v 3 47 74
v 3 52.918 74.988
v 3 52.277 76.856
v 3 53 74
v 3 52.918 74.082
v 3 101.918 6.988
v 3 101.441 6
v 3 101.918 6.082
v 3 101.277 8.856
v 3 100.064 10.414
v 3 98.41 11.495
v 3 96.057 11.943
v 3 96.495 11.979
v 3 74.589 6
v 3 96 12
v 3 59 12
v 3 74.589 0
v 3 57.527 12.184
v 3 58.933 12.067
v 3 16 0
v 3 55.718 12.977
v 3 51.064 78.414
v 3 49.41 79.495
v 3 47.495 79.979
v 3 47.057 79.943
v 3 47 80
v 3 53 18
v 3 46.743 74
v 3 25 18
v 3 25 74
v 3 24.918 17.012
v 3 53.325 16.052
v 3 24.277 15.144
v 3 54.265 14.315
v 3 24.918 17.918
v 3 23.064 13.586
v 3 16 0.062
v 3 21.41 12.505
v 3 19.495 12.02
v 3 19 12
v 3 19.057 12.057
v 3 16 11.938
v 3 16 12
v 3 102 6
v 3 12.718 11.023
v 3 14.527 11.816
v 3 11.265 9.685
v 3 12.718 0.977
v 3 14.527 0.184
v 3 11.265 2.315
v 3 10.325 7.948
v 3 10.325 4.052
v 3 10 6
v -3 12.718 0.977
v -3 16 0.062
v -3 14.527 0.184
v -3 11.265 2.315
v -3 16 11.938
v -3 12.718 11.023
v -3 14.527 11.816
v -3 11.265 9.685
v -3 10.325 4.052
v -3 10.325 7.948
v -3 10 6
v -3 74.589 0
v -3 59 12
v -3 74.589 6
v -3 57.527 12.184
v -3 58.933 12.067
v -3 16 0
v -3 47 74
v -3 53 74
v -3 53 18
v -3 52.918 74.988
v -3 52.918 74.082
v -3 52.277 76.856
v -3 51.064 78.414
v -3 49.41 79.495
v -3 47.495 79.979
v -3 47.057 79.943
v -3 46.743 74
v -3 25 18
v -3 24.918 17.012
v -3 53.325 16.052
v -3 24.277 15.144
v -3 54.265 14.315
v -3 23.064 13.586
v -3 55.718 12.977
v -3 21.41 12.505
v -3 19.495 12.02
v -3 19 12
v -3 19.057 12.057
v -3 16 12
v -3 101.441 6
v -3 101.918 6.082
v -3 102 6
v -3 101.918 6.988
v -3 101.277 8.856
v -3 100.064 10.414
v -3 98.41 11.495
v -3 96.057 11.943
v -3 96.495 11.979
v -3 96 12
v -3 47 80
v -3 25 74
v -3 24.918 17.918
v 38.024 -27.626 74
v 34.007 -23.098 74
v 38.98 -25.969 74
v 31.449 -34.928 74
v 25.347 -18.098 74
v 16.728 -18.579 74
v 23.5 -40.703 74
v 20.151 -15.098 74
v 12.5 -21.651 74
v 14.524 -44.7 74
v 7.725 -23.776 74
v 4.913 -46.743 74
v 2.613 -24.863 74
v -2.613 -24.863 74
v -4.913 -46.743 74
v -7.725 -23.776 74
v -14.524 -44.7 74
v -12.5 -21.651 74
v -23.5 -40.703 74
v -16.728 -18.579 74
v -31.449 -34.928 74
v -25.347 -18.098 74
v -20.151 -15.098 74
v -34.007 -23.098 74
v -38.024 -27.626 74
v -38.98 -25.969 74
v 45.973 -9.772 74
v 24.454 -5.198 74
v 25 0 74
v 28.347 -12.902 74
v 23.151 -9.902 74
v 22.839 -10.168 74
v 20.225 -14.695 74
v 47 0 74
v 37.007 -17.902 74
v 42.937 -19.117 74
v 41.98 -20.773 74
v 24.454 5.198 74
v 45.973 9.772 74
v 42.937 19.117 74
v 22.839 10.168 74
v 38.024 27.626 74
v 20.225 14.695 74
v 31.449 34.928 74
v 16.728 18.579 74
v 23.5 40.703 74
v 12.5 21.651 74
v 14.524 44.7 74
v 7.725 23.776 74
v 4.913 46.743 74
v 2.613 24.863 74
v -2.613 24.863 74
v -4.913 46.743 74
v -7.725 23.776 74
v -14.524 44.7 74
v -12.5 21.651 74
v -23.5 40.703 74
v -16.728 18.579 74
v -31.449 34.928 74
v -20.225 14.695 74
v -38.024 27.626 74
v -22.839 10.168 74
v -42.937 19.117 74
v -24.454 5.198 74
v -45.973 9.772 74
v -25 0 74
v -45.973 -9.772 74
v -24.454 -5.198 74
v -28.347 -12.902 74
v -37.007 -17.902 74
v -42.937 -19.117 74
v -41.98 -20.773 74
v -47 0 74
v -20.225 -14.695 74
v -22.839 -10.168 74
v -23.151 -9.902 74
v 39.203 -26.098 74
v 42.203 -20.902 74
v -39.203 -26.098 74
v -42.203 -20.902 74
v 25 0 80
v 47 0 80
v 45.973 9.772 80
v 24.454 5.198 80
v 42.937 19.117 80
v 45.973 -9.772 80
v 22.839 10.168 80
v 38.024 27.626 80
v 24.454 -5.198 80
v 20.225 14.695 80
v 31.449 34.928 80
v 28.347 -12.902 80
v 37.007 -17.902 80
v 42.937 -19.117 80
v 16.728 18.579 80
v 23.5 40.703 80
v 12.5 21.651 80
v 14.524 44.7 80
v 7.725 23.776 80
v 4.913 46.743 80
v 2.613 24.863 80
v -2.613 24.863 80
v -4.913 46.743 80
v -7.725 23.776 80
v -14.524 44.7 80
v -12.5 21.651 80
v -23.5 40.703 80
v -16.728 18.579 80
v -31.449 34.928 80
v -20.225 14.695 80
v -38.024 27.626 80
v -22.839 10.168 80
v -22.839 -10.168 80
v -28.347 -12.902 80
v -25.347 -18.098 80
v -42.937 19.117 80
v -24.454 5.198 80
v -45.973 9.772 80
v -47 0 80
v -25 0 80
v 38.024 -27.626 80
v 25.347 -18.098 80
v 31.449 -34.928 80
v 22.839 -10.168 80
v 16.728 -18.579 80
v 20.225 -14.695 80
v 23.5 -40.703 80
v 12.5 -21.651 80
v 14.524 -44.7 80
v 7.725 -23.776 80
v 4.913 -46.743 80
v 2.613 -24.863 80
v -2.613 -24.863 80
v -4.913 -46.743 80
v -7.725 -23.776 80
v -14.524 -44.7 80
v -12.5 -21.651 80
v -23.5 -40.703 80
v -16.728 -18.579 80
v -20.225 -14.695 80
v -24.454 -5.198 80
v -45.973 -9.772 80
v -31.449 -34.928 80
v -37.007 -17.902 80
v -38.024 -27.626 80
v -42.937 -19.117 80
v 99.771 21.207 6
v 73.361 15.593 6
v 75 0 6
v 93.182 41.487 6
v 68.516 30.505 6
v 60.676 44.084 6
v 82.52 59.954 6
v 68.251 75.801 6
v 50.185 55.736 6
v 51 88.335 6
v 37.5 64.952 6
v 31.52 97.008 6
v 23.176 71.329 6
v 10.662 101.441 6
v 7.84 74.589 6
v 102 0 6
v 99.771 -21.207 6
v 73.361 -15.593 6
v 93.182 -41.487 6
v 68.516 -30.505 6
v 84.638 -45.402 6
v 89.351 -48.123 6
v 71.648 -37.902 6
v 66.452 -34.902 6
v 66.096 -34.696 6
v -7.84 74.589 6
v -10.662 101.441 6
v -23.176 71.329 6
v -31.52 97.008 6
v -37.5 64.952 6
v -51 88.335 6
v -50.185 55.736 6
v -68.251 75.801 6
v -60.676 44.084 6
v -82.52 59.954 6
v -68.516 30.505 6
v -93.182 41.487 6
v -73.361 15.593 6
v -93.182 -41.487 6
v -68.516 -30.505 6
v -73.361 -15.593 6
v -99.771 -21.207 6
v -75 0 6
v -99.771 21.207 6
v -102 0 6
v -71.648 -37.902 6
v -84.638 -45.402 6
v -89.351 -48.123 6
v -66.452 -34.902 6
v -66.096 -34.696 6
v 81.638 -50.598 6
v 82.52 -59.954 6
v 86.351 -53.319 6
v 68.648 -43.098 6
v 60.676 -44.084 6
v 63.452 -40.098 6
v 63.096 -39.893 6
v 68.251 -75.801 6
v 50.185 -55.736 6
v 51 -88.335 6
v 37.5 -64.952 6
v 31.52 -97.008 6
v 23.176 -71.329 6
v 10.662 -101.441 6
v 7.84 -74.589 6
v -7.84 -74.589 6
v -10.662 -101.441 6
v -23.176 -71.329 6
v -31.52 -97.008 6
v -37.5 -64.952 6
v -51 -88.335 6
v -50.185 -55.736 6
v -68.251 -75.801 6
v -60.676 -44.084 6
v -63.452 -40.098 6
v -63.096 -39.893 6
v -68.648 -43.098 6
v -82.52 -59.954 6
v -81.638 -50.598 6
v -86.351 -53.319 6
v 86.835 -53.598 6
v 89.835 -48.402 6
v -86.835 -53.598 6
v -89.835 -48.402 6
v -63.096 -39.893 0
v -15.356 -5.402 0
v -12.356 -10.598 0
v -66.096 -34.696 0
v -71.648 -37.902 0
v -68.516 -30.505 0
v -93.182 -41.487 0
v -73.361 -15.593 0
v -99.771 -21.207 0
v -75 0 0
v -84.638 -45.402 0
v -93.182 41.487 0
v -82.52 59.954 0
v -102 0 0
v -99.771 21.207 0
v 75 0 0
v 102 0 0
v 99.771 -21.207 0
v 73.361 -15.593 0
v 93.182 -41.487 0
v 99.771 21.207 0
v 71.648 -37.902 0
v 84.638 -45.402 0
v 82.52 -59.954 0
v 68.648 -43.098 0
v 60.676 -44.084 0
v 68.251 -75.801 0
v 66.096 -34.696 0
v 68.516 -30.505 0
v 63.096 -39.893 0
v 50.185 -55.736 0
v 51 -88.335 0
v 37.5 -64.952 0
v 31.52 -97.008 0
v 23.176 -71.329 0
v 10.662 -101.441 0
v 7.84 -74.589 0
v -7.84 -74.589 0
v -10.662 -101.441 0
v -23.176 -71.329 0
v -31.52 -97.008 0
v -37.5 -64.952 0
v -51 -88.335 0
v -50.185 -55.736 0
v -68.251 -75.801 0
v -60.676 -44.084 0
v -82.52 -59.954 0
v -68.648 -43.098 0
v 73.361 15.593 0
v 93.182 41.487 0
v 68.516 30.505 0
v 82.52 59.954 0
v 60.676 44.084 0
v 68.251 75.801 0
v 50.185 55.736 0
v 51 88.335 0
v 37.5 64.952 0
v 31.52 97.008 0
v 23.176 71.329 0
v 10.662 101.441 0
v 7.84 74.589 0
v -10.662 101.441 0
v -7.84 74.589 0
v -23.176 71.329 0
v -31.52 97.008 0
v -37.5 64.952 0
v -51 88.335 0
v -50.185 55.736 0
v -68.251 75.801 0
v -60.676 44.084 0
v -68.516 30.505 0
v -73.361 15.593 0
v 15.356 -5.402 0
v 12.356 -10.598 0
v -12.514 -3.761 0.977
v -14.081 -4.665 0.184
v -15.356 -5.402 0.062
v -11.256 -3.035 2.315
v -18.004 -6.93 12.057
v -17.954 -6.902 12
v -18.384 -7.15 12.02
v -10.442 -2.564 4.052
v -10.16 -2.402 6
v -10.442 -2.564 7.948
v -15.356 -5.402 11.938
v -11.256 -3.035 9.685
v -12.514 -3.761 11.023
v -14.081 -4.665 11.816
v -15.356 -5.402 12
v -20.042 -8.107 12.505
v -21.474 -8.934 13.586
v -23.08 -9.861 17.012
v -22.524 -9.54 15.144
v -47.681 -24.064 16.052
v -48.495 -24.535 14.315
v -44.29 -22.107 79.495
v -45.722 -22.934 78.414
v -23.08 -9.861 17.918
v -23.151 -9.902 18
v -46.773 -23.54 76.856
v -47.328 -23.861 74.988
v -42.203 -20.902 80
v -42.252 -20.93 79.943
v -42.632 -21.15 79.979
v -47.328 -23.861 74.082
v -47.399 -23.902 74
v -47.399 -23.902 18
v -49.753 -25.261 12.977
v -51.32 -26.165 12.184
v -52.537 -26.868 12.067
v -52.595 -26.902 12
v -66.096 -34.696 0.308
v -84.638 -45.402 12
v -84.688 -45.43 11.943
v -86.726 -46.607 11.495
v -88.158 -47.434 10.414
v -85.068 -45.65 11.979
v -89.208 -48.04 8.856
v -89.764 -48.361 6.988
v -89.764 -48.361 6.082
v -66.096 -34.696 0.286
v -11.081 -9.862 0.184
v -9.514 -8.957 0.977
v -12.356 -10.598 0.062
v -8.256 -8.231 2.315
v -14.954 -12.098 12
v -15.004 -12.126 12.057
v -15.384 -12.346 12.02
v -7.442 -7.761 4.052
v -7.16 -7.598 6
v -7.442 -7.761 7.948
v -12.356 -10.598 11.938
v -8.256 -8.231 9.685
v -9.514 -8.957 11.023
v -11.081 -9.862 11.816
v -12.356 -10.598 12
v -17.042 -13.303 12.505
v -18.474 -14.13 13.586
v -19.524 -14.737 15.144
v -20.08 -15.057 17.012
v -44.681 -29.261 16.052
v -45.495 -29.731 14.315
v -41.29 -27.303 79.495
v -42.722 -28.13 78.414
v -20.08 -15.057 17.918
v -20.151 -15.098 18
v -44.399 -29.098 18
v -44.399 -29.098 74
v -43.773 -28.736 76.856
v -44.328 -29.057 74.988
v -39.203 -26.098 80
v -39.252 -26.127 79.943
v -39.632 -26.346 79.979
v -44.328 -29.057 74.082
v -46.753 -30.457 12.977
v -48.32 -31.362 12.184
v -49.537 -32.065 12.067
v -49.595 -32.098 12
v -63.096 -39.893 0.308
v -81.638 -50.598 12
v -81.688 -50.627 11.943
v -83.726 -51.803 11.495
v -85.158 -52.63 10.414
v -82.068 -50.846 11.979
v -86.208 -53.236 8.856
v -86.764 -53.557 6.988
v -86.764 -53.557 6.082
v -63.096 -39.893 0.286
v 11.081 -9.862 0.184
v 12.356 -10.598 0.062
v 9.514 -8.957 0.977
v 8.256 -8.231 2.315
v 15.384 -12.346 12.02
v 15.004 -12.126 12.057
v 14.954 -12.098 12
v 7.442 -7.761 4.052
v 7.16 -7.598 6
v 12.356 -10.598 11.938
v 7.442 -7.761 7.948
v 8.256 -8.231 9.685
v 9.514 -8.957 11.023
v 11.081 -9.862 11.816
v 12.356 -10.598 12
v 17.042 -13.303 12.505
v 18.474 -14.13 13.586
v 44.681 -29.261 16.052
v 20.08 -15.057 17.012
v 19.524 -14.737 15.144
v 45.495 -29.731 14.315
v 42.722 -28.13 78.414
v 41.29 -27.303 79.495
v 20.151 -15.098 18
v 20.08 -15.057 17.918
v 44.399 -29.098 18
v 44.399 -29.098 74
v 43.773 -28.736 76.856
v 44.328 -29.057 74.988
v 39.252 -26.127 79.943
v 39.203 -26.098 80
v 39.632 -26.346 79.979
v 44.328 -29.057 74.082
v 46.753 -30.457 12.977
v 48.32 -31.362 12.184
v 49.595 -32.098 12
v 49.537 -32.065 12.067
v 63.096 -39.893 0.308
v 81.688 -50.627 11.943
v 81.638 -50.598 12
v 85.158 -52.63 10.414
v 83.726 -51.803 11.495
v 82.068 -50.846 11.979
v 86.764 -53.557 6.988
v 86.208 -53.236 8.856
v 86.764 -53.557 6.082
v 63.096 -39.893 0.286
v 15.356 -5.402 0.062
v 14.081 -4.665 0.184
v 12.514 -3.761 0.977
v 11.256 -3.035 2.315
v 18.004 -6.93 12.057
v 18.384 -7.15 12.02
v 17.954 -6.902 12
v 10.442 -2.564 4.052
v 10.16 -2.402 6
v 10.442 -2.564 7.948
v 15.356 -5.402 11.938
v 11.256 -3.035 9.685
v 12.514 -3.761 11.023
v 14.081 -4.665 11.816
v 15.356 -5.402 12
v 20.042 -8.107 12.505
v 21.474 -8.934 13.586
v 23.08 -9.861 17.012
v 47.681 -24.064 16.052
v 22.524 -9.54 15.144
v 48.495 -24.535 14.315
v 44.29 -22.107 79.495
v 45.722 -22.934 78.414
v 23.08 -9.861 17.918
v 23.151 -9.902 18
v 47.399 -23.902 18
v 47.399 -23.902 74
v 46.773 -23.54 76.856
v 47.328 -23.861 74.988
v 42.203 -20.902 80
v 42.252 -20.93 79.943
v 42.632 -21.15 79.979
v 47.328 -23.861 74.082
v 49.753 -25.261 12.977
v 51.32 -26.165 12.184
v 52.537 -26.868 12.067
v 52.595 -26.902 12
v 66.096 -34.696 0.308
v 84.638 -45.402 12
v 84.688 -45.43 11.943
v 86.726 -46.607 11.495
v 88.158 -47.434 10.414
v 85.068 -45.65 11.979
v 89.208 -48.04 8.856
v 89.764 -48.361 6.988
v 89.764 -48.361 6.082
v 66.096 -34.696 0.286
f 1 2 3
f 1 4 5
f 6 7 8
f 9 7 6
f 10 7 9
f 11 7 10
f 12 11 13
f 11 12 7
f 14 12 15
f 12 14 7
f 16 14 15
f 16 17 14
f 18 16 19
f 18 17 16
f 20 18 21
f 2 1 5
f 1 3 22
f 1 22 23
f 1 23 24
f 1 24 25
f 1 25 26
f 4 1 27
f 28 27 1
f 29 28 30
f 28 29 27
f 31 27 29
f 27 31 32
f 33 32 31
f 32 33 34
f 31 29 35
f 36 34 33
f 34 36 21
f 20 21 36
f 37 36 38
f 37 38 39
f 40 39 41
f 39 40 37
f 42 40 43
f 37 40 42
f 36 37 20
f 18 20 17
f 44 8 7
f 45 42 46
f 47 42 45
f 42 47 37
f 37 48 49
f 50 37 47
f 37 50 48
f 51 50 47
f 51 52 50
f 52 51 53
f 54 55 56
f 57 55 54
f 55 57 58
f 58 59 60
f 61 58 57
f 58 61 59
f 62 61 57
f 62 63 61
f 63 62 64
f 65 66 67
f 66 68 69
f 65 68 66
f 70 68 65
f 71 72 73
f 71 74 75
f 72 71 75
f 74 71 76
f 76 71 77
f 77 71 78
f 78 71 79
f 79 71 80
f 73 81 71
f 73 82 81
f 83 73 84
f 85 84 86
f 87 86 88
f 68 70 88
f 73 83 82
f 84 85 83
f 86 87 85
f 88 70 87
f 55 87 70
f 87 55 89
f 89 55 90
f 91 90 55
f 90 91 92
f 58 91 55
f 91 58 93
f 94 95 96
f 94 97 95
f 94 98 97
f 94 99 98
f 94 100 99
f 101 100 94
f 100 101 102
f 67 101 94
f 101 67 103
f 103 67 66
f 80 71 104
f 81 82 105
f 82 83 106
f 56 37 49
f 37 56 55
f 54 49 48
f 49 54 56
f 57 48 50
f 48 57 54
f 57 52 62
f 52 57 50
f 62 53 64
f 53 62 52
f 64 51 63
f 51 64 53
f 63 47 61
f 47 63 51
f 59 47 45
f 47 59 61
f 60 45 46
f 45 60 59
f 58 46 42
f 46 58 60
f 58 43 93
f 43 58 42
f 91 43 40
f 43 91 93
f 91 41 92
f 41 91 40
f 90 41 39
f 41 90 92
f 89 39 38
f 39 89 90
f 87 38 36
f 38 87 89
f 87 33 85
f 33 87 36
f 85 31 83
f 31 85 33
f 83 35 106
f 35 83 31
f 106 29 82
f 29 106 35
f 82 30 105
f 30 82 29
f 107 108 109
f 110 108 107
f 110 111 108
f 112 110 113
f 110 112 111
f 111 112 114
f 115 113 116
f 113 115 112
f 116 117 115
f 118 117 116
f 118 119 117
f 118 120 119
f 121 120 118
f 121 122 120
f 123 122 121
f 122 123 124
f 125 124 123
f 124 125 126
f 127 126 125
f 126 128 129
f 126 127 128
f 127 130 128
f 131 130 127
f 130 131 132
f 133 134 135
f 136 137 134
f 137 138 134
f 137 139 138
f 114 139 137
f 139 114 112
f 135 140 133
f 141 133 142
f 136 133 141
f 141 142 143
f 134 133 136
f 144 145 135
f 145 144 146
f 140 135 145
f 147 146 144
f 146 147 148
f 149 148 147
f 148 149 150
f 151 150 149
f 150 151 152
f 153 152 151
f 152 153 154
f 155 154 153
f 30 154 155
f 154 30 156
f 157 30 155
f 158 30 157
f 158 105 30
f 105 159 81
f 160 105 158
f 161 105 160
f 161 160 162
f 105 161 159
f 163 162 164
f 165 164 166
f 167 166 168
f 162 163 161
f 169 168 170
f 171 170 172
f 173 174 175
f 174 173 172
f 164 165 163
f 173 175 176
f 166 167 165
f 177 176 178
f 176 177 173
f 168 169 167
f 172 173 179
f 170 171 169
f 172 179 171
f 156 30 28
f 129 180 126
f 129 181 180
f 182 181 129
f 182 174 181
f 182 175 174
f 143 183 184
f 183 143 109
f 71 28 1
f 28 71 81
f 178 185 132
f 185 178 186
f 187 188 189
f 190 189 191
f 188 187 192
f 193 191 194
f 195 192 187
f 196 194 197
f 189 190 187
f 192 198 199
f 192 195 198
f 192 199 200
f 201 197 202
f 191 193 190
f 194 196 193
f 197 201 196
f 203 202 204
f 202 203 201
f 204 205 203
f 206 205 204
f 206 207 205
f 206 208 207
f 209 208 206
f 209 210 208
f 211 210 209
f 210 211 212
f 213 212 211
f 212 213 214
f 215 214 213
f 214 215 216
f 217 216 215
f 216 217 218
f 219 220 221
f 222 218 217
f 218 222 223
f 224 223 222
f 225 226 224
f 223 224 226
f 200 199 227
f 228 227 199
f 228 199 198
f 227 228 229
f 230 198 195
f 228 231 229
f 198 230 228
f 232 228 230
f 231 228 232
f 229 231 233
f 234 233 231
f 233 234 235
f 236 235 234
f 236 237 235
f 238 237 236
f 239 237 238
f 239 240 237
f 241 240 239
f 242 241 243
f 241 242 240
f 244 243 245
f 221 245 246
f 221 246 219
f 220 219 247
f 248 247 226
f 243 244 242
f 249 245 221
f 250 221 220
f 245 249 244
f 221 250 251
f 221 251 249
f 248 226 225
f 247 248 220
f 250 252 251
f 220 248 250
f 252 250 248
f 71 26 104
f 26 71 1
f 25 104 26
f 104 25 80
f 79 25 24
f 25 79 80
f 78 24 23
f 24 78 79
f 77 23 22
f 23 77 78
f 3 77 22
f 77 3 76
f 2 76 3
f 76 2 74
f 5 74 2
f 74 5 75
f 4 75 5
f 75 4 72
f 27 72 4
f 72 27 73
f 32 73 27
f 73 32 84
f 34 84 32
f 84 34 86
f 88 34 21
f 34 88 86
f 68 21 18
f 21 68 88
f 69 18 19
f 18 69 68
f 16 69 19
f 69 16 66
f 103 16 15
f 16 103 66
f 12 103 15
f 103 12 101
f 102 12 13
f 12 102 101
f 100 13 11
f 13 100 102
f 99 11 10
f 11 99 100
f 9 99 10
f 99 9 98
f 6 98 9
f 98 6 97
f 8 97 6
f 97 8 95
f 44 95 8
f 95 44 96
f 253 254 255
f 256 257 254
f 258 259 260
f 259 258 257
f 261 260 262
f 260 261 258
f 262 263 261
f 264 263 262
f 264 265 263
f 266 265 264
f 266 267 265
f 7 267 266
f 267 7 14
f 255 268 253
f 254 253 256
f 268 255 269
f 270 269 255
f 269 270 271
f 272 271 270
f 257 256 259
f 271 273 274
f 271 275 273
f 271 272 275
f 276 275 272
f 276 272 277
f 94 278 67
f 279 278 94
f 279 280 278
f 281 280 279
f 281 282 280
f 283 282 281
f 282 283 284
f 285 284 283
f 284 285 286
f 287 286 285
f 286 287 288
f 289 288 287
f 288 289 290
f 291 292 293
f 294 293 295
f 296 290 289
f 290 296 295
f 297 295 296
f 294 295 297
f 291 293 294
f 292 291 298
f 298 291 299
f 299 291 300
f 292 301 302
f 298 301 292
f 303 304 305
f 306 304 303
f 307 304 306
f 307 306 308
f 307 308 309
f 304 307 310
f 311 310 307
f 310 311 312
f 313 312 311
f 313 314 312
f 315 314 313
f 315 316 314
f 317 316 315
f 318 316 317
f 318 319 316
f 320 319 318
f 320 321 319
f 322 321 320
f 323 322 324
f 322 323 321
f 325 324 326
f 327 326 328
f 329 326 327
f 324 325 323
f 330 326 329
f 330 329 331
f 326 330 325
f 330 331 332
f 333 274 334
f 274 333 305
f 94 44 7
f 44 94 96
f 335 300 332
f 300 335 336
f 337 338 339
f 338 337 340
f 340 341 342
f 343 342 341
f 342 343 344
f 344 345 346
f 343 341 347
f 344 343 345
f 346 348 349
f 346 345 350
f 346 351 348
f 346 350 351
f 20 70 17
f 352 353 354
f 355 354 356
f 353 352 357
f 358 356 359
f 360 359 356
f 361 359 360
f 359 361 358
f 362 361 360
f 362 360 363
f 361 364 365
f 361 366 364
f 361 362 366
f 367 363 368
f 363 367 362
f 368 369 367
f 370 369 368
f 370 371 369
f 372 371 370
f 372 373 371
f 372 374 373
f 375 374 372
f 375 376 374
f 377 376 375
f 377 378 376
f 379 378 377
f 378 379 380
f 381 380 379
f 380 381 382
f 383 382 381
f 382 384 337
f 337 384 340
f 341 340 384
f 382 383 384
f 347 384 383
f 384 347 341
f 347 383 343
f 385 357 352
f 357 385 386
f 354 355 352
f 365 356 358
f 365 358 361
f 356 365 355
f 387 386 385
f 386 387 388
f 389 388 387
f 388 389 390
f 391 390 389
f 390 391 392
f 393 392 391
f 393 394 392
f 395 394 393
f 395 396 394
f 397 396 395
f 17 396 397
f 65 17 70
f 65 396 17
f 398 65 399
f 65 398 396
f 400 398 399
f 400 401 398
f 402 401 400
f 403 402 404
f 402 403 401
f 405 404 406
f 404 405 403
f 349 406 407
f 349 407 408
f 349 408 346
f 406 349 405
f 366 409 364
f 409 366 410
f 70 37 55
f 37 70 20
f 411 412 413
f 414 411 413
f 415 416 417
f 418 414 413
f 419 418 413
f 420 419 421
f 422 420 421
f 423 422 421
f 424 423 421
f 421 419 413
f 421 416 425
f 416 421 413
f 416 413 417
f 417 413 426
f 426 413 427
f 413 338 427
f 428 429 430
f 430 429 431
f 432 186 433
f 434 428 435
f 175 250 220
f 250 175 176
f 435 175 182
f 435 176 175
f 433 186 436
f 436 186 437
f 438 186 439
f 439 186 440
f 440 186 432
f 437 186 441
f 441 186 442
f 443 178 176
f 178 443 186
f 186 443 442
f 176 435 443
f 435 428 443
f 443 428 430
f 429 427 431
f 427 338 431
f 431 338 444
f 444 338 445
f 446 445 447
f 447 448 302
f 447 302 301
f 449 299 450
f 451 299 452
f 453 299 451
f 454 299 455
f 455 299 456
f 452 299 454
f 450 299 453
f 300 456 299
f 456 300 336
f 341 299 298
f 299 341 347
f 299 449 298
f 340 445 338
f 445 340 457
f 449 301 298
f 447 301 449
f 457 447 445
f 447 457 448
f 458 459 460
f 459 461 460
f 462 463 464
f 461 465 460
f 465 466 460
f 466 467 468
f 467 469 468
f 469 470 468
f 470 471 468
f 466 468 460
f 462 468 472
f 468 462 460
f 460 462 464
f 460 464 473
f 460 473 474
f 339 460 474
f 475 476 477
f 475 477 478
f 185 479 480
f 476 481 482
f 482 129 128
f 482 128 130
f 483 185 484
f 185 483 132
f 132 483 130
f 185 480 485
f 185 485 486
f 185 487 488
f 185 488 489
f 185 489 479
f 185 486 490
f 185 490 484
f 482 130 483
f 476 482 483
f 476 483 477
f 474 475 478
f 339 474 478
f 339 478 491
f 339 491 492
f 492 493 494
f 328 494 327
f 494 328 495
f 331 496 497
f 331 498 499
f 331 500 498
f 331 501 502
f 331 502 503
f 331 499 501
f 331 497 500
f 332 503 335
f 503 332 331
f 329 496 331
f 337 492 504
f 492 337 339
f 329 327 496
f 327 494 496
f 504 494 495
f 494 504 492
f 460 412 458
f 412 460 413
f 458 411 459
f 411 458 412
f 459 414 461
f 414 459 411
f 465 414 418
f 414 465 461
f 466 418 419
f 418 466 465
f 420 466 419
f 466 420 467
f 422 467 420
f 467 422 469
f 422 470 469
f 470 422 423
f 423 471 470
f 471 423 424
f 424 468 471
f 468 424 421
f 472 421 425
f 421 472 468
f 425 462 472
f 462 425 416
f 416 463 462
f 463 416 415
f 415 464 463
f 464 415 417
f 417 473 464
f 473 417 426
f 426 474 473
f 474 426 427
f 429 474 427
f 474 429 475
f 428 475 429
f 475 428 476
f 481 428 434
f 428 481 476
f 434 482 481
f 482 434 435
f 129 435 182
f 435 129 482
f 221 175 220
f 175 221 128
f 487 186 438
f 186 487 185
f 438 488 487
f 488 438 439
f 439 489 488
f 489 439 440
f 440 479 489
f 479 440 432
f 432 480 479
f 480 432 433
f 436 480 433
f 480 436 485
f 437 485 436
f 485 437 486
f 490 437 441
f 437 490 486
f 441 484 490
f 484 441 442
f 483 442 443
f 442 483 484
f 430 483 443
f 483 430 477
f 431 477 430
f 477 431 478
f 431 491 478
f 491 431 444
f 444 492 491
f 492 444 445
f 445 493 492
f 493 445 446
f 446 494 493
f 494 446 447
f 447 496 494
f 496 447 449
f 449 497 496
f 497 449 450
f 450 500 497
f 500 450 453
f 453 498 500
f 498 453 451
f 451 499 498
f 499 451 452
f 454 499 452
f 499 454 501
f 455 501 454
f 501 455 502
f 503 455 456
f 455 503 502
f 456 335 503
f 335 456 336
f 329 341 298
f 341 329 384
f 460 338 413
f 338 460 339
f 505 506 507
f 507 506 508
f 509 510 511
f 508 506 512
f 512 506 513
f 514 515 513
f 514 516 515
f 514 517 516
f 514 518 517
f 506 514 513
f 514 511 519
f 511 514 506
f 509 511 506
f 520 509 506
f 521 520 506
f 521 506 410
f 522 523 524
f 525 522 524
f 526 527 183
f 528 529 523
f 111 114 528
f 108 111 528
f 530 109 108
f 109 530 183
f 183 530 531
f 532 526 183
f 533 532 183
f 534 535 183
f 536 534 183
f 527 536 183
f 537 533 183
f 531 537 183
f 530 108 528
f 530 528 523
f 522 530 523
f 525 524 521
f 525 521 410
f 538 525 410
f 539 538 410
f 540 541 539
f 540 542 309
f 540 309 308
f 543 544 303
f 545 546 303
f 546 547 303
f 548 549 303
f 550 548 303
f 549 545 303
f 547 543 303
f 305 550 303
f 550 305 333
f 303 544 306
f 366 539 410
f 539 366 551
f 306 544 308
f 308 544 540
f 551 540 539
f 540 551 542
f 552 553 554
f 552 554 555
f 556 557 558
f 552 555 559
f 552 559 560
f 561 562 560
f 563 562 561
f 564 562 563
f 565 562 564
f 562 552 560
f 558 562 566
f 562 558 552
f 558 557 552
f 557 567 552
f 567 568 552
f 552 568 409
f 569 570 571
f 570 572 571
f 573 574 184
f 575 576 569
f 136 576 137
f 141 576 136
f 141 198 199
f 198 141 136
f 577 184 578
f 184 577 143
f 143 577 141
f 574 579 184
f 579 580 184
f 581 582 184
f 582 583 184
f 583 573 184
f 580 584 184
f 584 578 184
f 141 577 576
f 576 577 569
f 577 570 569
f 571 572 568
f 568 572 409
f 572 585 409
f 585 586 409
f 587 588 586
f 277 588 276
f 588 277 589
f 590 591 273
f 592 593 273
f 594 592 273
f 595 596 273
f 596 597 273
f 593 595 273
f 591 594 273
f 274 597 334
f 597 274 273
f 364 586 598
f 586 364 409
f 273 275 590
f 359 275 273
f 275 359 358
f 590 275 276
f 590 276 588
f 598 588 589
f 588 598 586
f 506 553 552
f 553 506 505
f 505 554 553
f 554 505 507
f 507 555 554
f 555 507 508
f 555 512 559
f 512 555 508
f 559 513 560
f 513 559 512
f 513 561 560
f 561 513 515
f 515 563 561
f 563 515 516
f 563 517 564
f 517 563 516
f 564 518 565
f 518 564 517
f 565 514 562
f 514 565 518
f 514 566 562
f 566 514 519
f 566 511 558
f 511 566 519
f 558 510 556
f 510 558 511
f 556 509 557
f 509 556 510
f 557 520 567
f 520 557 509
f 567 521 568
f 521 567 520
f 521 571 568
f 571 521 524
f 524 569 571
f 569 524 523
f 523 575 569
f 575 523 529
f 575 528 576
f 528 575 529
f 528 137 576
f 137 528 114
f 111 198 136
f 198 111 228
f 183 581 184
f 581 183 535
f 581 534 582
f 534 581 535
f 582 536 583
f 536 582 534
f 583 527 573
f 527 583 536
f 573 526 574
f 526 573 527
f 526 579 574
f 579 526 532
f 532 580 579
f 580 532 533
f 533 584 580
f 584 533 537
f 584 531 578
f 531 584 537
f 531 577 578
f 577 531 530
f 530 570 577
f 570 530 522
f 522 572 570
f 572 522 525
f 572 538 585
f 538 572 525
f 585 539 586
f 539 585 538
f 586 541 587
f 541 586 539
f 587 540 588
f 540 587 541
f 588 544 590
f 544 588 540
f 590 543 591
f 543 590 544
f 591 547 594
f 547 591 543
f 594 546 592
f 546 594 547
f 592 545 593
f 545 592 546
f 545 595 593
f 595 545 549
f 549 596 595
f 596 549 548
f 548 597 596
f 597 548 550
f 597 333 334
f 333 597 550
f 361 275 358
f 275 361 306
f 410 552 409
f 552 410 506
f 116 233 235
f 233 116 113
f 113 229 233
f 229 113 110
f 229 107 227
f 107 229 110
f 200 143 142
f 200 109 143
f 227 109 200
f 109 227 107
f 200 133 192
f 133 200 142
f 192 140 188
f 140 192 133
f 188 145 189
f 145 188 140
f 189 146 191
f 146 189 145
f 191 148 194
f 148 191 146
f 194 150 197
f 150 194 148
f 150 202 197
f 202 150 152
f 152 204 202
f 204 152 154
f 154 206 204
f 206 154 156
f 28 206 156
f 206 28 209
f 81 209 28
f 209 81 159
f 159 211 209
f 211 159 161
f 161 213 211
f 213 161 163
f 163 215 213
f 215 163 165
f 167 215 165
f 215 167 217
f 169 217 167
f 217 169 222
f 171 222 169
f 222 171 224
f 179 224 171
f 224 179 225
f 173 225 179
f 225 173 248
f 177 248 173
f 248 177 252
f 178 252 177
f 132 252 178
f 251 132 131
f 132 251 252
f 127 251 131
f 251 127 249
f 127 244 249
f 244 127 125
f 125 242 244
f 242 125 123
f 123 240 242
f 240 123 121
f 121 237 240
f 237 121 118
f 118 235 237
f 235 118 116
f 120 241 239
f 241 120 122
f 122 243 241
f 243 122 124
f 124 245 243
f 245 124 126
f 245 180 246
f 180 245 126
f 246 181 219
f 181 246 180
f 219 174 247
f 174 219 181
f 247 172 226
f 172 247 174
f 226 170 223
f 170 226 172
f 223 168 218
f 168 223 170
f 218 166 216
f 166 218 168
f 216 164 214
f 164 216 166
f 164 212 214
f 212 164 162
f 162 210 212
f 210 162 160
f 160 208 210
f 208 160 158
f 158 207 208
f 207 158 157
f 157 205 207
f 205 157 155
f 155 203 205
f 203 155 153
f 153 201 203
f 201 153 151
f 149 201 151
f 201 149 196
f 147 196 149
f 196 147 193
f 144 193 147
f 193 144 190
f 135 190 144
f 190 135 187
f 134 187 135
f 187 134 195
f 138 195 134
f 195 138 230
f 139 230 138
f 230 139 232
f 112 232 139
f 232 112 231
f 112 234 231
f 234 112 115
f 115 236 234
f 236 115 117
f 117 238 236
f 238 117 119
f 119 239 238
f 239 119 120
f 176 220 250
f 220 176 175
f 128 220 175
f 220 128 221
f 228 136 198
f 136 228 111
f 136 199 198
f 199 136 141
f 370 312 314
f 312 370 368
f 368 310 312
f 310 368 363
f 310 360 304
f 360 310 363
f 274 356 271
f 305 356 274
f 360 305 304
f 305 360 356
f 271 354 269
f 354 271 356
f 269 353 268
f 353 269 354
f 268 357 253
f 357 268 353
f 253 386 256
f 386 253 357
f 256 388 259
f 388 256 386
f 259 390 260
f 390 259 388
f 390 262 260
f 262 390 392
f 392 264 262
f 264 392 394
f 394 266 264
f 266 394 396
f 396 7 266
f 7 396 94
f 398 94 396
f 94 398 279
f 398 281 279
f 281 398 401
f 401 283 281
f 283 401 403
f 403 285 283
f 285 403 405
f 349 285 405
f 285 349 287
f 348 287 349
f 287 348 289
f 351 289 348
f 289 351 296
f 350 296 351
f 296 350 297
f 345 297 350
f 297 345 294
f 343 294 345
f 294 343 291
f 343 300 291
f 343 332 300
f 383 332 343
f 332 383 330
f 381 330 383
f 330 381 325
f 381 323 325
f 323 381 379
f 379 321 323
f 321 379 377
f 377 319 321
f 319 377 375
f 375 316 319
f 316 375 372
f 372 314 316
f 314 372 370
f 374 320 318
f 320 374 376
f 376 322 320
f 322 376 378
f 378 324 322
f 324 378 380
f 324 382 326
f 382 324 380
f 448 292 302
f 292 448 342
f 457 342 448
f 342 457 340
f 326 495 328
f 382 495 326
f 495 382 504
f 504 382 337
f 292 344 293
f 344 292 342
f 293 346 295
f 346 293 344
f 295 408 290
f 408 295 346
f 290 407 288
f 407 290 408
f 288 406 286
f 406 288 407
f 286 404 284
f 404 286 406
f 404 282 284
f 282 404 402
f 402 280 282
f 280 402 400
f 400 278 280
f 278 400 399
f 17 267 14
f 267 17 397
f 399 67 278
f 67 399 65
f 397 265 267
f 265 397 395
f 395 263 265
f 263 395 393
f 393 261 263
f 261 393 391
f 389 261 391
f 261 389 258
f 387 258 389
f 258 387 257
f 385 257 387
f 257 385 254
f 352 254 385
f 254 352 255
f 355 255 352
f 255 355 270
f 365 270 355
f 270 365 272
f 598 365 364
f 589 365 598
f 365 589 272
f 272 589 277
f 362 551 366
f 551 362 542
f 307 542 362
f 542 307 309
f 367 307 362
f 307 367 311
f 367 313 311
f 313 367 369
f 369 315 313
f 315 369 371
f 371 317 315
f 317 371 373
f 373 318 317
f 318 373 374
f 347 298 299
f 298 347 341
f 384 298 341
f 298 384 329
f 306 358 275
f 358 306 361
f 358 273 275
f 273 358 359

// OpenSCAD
// To render the DXF file from the command line:
// openscad -o example017.dxf -D'mode="parts"' example017.scad

//Mode can be either "parts",  "exploded" or "assembled".
mode = "assembled"; // ["parts",  "exploded", "assembled"]

thickness = 6;
locklen1 = 15;
locklen2 = 10;
boltlen = 15;
midhole = 10;
inner1_to_inner2 = 50;
total_height = 80;

module shape_tripod()
{
  x1 = 0;
  x2 = x1 + thickness;
  x3 = x2 + locklen1;
  x4 = x3 + thickness;
  x5 = x4 + inner1_to_inner2;
  x6 = x5 - thickness;
  x7 = x6 - locklen2;
  x8 = x7 - thickness;
  x9 = x8 - thickness;
  x10 = x9 - thickness;

  y1 = 0;
  y2 = y1 + thickness;
  y3 = y2 + thickness;
  y4 = y3 + thickness;
  y5 = y3 + total_height - 3*thickness;
  y6 = y5 + thickness;

  union() {
    difference() {
      polygon([
        [ x1, y2 ], [ x2, y2 ],
        [ x2, y1 ], [ x3, y1 ], [ x3, y2 ],
        [ x4, y2 ], [ x4, y1 ], [ x5, y1 ],
        [ x5 + thickness, y3 ], [ x5, y4 ],
        [ x5, y5 ],
        [ x6, y5 ], [ x6, y6 ], [ x7, y6 ], [ x7, y5 ], [ x8, y5 ],
        [ x8, y6 ], [ x9, y5 ],
        [ x9, y4 ], [ x10, y3 ],
        [ x2, y3 ]
      ]);
      translate([ x10, y4 ]) circle(thickness);
      translate([ x5 + thickness, y4 ]) circle(thickness);
    }

    translate([ x5, y1 ]) square([ boltlen - thickness, thickness*2 ]);

    translate([ x5 + boltlen - thickness, y2 ]) circle(thickness);

    translate([ x2, y2 ]) intersection() {
      circle(thickness);
      translate([ -thickness*2, 0 ]) square(thickness*2);
    }

    translate([ x8, y5 ]) intersection() {
      circle(thickness);
      translate([ -thickness*2, 0 ]) square(thickness*2);
    }
  }
}

module shape_inner_disc()
{
  difference() {
    circle(midhole + boltlen + 2*thickness + locklen2);
    for (alpha = [ 0, 120, 240 ]) {
      rotate(alpha) translate([ 0, midhole + boltlen + thickness + locklen2/2 ]) square([ thickness, locklen2 ], true);
    }
    circle(midhole + boltlen);
  }
}

module shape_outer_disc()
{
  difference() {
    circle(midhole + boltlen + inner1_to_inner2 + 2*thickness + locklen1);
    for (alpha = [ 0, 120, 240 ]) {
      rotate(alpha) translate([ 0, midhole + boltlen + inner1_to_inner2 + thickness + locklen1/2 ]) square([ thickness, locklen1 ], true);
    }
    circle(midhole + boltlen + inner1_to_inner2);
  }
}

module parts()
{
  tripod_x_off = locklen1 - locklen2 + inner1_to_inner2;
  tripod_y_off = max(midhole + boltlen + inner1_to_inner2 + 4*thickness + locklen1, total_height);

  shape_inner_disc();
  shape_outer_disc();

  for (s = [ [1,1], [-1,1], [1,-1] ]) {
    scale(s) translate([ tripod_x_off, -tripod_y_off ]) shape_tripod();
  }
}

module exploded()
{
  translate([ 0, 0, total_height + 2*thickness ]) linear_extrude(height = thickness, convexity = 4) shape_inner_disc();
  linear_extrude(height = thickness, convexity = 4) shape_outer_disc();

  color([ 0.7, 0.7, 1 ]) for (alpha = [ 0, 120, 240 ]) {
    rotate(alpha)
      translate([ 0, thickness*2 + locklen1 + inner1_to_inner2 + boltlen + midhole, 1.5*thickness ])
        rotate([ 90, 0, -90 ])
          linear_extrude(height = thickness, convexity = 10, center = true) shape_tripod();
  }
}

module bottle()
{
  r = boltlen + midhole;
  h = total_height - thickness*2;

  rotate_extrude(convexity = 2) {
    square([ r, h ]);

    translate([ 0, h ]) {
      intersection() {
        square([ r, r ]);
        scale([ 1, 0.7 ]) circle(r);
      }
    }
    translate([ 0, h+r ]) {
      intersection() {
        translate([ 0, -r/2 ]) square([ r/2, r ]);
        circle(r/2);
      }
    }
  }
}

module assembled()
{
  translate([ 0, 0, total_height - thickness ]) linear_extrude(height = thickness, convexity = 4) shape_inner_disc();
  linear_extrude(height = thickness, convexity = 4) shape_outer_disc();

  color([ 0.7, 0.7, 1 ]) for (alpha = [ 0, 120, 240 ]) {
    rotate(alpha)
      translate([ 0, thickness*2 + locklen1 + inner1_to_inner2 + boltlen + midhole, 0 ])
        rotate([ 90, 0, -90 ])
          linear_extrude(height = thickness, convexity = 10, center = true) shape_tripod();
  }

  % translate([ 0, 0, thickness*2]) bottle();
}

echo(version=version());

if (mode == "parts") parts();

if (mode == "exploded") exploded();

if (mode == "assembled") assembled();

// Written by Clifford Wolf <clifford@clifford.at> and Marius
// Kintel <marius@kintel.net>
//
// To the extent possible under law, the author(s) have dedicated all
// copyright and related and neighboring rights to this software to the
// public domain worldwide. This software is distributed without any
// warranty.
//
// You should have received a copy of the CC0 Public Domain
// Dedication along with this software.
// If not, see <http://creativecommons.org/publicdomain/zero/1.0/>.
